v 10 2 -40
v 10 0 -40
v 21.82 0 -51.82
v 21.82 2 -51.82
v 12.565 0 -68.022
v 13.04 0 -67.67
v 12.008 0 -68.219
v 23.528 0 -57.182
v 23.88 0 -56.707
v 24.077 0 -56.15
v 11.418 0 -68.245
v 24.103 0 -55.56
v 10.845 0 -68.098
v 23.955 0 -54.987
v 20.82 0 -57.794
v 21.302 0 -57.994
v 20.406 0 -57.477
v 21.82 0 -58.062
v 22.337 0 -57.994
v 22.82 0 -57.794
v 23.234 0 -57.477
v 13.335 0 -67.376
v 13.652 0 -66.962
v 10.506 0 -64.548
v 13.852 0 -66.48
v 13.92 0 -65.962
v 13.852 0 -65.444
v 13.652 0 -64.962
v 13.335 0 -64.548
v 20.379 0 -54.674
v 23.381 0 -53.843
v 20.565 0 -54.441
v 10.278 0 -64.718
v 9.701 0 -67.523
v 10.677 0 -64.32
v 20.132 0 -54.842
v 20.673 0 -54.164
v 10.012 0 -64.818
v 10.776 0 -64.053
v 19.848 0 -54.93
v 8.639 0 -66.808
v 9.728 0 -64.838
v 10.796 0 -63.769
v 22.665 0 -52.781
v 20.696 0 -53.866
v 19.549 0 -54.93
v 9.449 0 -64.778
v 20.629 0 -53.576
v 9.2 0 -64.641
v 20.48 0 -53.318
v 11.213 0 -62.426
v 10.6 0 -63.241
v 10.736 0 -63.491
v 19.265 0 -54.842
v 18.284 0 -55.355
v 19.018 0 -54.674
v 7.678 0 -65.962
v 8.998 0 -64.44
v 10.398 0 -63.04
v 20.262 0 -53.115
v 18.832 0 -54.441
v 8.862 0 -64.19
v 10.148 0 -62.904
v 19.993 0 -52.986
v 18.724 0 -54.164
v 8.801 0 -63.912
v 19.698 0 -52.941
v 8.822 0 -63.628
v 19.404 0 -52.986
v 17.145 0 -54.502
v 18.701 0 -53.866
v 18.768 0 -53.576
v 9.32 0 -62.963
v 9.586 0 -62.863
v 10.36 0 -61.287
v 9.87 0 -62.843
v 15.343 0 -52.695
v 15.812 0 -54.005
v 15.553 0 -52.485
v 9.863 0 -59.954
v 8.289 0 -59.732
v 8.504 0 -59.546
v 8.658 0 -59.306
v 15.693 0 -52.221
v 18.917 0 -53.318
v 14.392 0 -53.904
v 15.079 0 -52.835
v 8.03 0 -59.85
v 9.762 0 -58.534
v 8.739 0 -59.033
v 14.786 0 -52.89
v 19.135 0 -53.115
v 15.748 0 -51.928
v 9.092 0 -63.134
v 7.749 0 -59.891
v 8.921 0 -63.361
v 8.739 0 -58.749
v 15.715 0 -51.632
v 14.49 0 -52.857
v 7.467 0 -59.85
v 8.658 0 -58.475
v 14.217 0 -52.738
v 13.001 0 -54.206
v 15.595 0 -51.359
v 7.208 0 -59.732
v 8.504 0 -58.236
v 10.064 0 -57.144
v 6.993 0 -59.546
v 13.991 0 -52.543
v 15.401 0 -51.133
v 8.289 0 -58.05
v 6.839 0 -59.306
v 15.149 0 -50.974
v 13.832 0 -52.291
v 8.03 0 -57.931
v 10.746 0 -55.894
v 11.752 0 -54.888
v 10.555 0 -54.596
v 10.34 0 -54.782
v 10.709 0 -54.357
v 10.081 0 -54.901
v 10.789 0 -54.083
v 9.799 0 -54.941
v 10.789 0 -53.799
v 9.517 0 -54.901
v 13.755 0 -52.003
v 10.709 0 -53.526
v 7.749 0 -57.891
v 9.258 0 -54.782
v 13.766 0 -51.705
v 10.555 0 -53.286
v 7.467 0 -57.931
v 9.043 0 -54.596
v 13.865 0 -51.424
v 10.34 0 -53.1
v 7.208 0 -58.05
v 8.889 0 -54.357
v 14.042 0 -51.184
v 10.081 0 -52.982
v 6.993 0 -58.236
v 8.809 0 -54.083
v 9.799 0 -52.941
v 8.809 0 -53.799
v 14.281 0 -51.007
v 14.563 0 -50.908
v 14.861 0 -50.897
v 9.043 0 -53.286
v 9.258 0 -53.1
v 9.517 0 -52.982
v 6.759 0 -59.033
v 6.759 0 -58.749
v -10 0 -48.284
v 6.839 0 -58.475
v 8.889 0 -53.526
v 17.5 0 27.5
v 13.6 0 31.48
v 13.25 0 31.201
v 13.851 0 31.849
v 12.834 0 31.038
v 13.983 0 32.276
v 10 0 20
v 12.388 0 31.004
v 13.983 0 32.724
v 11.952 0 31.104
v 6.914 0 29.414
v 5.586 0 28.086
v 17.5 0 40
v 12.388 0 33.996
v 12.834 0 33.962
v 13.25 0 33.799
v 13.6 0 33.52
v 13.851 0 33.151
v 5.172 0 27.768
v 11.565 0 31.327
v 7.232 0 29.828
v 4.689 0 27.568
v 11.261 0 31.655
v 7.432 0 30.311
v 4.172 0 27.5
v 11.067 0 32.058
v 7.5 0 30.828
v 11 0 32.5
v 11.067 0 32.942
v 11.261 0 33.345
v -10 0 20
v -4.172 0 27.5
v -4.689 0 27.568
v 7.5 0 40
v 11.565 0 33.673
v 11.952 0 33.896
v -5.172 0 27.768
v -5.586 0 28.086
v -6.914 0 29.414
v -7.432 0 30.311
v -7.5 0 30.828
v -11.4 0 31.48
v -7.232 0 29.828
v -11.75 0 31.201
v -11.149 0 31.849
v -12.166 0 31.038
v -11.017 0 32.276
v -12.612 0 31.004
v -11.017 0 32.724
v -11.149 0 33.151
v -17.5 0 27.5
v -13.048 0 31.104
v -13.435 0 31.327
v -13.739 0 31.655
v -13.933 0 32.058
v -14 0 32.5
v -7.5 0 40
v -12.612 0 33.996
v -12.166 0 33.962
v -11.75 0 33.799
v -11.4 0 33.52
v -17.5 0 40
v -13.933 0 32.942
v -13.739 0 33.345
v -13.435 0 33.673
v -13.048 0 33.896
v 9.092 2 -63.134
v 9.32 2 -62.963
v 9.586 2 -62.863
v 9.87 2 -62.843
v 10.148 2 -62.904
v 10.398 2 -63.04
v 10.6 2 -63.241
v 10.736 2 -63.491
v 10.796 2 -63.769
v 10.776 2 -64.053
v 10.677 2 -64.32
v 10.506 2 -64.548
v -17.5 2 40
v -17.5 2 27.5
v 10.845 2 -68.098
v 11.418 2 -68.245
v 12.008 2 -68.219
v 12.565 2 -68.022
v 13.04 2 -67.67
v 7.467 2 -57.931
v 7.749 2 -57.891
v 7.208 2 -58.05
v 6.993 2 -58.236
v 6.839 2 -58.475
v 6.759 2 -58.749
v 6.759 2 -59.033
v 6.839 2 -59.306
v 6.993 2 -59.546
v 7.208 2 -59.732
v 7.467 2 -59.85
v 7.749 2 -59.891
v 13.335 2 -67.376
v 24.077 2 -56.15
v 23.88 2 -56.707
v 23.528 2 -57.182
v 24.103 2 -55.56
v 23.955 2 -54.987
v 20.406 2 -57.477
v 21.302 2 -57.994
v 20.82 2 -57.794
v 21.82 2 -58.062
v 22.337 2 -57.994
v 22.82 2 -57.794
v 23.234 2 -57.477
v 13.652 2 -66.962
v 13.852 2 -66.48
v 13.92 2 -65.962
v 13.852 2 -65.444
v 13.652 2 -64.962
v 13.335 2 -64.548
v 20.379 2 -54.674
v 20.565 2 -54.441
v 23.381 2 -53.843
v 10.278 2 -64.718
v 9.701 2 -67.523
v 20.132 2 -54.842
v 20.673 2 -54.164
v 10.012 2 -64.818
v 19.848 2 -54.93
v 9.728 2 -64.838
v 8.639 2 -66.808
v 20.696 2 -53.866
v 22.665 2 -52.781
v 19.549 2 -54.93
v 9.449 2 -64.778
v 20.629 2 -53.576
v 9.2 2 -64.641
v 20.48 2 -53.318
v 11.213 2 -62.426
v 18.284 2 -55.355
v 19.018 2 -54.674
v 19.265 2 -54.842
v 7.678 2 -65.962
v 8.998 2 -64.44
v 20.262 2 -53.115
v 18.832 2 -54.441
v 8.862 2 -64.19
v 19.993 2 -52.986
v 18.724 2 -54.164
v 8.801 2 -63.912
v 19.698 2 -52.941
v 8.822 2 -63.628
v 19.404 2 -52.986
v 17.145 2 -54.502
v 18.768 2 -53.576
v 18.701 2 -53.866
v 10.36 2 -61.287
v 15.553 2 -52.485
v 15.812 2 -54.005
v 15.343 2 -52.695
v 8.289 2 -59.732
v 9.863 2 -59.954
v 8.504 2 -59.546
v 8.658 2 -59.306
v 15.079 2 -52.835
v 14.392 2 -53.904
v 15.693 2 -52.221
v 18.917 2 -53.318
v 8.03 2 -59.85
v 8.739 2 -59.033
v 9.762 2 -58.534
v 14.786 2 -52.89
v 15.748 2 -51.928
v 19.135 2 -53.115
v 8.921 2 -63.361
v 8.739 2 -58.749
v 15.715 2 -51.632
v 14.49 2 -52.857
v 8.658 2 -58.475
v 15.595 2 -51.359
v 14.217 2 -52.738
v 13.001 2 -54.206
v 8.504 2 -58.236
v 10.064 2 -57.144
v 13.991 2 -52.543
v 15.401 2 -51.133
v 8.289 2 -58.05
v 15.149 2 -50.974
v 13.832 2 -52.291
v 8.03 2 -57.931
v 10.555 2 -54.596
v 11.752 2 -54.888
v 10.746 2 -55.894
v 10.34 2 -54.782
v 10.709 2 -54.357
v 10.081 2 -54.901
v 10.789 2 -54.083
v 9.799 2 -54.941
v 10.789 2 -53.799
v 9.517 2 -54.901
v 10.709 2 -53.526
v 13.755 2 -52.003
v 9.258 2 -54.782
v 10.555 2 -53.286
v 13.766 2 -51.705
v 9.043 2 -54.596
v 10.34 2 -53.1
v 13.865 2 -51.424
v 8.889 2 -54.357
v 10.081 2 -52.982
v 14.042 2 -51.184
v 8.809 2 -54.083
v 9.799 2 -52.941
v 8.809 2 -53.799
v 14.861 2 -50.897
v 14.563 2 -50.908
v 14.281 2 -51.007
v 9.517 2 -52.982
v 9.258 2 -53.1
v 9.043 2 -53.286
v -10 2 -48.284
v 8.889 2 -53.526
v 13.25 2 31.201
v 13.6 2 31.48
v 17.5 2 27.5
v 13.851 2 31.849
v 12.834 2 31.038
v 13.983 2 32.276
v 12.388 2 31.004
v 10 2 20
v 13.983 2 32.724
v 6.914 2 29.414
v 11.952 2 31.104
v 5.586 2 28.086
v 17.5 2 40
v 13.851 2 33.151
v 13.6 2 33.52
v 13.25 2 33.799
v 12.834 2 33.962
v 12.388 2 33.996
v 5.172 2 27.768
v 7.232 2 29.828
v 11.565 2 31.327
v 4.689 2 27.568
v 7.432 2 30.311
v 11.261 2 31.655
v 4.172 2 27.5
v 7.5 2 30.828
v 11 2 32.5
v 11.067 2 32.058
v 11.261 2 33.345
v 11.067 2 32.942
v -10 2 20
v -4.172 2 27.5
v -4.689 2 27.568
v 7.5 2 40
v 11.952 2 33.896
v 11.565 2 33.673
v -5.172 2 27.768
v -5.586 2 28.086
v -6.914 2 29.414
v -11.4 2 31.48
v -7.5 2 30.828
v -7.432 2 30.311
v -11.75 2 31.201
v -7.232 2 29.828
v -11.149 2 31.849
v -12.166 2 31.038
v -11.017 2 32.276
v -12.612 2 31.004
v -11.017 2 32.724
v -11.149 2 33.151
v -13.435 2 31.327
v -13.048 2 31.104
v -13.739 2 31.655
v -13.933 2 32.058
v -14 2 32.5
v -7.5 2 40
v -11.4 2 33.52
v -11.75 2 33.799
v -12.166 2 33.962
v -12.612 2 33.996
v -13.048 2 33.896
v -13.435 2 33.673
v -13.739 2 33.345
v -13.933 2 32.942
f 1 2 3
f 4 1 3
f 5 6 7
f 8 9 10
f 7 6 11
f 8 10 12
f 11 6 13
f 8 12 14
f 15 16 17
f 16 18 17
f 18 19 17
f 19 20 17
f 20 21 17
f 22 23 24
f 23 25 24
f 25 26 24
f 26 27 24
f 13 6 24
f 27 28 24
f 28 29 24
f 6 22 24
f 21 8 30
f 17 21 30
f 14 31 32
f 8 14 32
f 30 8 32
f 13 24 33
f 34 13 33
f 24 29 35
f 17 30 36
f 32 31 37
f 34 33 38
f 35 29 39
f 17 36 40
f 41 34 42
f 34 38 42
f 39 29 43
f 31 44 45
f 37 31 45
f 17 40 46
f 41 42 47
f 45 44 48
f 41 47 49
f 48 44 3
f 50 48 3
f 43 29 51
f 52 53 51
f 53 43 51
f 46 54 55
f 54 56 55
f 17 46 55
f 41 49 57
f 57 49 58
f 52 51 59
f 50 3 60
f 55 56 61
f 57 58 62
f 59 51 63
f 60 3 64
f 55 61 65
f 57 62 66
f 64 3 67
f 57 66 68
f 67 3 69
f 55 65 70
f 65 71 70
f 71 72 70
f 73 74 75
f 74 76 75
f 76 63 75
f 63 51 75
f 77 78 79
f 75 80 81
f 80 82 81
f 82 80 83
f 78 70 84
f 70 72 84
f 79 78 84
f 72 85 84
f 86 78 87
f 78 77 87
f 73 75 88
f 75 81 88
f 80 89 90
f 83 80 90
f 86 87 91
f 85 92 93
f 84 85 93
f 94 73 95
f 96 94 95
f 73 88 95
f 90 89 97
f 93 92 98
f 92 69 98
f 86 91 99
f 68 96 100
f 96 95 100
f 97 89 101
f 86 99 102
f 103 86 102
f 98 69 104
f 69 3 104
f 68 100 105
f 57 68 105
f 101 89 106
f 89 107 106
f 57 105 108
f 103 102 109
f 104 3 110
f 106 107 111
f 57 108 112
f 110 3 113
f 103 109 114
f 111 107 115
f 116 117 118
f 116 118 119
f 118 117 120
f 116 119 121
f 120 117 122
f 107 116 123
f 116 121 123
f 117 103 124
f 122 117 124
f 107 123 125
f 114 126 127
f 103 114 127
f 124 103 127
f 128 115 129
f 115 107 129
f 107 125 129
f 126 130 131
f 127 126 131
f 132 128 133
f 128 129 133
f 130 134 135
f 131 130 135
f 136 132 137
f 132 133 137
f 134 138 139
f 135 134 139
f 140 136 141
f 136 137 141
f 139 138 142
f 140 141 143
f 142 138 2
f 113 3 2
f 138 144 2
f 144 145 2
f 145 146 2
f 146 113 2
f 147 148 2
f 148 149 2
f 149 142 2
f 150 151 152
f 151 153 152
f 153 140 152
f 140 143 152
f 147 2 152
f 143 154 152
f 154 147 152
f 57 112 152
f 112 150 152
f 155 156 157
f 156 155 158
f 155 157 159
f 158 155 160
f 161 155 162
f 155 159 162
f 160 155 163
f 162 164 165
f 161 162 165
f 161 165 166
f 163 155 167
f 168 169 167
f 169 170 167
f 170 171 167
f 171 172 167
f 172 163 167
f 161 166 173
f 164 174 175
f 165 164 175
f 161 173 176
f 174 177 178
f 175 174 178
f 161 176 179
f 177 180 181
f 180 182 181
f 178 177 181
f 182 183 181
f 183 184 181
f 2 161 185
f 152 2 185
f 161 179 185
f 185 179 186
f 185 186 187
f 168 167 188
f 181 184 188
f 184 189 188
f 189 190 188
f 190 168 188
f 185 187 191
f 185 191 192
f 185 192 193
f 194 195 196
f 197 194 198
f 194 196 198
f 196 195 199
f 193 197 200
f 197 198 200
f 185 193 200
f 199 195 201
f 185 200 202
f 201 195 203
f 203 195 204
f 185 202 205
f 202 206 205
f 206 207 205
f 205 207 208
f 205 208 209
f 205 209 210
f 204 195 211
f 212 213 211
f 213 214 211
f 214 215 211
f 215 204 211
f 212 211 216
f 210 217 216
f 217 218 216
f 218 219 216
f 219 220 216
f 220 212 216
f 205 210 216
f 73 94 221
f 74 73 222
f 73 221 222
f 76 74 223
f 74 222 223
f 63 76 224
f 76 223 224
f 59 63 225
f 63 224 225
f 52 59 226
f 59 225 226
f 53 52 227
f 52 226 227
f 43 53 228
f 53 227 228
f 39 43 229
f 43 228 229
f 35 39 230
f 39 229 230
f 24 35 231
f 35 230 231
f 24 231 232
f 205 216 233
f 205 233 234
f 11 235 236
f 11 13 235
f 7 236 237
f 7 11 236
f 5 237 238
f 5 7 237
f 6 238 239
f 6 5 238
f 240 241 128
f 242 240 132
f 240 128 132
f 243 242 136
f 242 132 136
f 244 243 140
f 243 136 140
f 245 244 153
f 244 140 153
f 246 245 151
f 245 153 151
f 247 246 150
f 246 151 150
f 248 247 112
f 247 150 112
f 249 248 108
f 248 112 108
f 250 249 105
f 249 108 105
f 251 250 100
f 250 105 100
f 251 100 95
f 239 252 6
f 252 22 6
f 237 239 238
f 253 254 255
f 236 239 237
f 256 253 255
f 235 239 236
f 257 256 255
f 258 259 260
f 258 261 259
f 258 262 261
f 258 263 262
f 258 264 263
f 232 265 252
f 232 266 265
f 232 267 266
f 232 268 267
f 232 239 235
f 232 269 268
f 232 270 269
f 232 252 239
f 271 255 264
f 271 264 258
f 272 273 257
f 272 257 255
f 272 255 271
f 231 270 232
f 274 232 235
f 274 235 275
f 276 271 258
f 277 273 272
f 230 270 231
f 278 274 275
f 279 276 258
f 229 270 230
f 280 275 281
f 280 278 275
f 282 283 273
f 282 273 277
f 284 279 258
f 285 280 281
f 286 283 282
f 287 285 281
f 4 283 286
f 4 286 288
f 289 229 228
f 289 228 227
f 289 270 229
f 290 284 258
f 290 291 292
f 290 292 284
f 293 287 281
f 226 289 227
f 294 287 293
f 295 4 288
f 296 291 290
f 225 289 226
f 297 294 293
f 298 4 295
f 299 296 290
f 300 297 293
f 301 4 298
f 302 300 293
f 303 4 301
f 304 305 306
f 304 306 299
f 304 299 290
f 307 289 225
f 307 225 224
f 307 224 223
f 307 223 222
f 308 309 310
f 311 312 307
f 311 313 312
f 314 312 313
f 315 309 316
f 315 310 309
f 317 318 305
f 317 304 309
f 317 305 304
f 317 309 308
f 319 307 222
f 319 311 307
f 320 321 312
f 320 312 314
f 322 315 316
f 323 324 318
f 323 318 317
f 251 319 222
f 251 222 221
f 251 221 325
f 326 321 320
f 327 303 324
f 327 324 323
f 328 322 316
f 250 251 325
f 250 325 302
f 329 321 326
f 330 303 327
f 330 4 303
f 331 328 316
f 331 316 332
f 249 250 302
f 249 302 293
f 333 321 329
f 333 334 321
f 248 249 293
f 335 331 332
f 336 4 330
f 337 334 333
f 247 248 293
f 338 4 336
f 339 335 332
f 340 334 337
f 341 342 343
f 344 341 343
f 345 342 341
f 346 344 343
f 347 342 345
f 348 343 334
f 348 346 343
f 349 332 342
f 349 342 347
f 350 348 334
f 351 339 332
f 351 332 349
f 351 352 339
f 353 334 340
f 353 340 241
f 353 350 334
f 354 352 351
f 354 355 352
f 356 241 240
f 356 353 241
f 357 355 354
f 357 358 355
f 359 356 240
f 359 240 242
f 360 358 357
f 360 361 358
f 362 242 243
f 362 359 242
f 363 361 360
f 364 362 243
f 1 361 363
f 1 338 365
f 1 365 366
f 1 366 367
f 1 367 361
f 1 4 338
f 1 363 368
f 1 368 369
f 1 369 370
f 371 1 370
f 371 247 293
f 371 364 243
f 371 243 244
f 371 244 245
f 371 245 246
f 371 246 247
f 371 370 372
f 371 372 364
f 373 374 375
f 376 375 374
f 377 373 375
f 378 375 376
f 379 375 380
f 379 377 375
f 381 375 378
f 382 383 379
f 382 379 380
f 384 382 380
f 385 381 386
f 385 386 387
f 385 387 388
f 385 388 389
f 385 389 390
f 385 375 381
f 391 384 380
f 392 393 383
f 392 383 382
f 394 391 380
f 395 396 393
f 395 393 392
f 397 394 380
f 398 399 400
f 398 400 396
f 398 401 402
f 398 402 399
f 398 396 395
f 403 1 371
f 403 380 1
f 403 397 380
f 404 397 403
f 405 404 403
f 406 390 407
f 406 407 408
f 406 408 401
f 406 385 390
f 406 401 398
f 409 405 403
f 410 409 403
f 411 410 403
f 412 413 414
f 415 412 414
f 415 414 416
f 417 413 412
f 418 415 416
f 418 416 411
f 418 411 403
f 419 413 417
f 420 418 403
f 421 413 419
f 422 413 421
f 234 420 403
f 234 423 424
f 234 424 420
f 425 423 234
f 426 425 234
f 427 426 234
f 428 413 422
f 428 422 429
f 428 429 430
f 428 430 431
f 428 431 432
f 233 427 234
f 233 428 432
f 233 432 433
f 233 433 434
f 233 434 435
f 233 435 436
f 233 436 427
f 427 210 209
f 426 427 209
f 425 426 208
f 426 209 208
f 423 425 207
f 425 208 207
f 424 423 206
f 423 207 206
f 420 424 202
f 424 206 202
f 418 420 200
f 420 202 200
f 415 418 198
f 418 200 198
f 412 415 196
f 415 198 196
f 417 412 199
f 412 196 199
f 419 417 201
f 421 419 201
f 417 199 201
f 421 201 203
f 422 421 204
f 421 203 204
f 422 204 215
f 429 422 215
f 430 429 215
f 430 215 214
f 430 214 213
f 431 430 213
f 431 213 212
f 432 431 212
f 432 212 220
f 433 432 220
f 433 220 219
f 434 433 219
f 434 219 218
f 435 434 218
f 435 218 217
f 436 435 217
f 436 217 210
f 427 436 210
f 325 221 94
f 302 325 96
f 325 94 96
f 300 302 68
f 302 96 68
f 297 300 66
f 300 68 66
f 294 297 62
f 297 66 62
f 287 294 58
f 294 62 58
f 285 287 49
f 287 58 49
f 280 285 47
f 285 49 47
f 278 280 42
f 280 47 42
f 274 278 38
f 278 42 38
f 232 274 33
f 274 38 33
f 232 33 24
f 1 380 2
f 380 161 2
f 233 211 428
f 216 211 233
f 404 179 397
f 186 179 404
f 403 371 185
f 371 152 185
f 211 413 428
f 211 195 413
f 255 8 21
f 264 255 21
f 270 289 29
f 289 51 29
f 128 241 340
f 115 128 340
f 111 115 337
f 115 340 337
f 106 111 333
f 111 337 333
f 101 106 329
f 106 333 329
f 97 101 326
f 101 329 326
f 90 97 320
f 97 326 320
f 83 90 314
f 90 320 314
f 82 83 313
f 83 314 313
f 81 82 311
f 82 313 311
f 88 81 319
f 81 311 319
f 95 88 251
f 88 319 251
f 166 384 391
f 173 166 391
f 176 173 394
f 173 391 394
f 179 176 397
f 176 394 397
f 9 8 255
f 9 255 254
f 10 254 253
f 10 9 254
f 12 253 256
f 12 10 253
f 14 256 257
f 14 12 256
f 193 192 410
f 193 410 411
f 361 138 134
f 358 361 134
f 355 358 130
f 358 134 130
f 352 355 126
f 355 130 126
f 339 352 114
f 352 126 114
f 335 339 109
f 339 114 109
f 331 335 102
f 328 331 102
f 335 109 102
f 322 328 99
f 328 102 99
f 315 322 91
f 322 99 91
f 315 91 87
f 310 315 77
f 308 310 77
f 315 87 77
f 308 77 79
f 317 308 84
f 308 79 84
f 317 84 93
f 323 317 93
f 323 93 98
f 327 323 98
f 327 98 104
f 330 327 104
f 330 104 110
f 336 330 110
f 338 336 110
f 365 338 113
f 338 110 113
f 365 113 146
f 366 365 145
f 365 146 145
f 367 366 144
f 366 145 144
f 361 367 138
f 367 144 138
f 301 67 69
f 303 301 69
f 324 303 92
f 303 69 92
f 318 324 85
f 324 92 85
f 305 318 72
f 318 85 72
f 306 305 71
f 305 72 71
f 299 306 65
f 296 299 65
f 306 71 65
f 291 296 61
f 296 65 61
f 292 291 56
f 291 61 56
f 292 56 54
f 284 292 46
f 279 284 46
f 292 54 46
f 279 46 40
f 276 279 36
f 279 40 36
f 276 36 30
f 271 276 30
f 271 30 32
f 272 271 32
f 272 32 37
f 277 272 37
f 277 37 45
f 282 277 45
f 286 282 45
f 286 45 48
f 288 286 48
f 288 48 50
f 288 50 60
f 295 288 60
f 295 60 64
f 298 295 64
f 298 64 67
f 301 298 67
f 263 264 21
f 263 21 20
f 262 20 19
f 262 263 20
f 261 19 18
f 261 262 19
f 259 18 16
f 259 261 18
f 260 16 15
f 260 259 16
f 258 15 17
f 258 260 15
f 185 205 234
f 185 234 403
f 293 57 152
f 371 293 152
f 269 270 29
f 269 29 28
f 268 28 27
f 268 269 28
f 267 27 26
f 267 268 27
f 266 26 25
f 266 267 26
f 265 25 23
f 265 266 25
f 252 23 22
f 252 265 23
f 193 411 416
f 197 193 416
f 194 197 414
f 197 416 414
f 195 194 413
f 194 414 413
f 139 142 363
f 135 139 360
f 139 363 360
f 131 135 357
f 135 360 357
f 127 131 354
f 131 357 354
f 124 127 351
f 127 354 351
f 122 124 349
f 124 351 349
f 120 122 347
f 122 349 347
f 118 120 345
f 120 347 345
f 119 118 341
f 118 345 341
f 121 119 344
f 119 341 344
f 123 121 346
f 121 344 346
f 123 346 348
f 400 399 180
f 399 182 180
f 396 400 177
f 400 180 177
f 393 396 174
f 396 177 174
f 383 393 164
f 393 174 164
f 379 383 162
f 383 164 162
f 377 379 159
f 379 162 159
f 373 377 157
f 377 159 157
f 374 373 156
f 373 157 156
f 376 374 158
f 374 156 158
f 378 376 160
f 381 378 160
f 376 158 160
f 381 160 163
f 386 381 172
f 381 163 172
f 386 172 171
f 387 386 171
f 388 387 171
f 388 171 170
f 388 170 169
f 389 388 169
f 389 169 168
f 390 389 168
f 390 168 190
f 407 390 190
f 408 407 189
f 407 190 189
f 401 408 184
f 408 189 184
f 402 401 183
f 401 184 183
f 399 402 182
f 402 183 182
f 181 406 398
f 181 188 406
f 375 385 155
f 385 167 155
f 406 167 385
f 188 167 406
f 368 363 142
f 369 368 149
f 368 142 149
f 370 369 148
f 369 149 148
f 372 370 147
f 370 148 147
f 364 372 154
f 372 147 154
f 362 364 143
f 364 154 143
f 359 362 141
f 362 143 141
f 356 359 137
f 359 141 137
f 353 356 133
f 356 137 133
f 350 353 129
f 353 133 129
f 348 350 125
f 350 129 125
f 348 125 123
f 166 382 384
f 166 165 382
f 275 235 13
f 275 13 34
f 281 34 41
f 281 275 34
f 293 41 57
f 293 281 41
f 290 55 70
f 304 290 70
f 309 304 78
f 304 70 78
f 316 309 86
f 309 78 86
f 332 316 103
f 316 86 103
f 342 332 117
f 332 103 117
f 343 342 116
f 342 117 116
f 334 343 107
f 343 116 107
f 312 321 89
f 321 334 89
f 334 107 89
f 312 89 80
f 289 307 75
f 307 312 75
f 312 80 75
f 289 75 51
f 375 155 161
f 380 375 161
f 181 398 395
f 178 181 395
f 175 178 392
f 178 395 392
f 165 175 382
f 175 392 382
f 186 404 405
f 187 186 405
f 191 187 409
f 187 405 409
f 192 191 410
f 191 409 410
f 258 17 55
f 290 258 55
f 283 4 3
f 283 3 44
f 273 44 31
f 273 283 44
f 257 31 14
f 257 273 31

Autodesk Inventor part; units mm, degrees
ref_plane "YZ Plane" through (0, 0, 0) normal (1, 0, 0) x (0, 1, 0)
ref_plane "XZ Plane" through (0, 0, 0) normal (0, 1, 0) x (-1, 0, 0)
ref_plane "XY Plane" through (0, 0, 0) normal (0, 0, 1) x (1, 0, 0)
sketch "スケッチ1" plane through (0, 0, 0) normal (0, 1, 0) x (-1, 0, 0)
  line L0 (-17.5, 40) -> (-7.5, 40)
  line L1 (-7.5, 40) -> (-7.5, 30)
  line L2 (-7.5, 30) -> (-5, 27.5)
  line L3 (-5, 27.5) -> (5, 27.5)
  line L4 (5, 27.5) -> (7.5, 30)
  line L5 (7.5, 30) -> (7.5, 40)
  line L6 (7.5, 40) -> (17.5, 40)
  circle A0 centre (-12.5, 32.5) radius 1.5
  circle A1 centre (12.5, 32.5) radius 1.5
  line L7 (-17.5, 40) -> (-17.5, 27.5)
  line L8 (-17.5, 27.5) -> (-10, 20)
  line L9 (17.5, 40) -> (17.5, 27.5)
  line L10 (17.5, 27.5) -> (10, 20)
  line L11 (-10, 20) -> (-10, -40)
  line L12 (-10, -40) -> (-25.3553, -55.3553)
  line L13 (-11.2132, -69.4975) -> (10, -48.2843)
  line L14 (10, -48.2843) -> (10, 20)
  line L15 (0, 0) -> (47.4517, 0)
  line L16 (-21.8198, -58.8909) -> (-18.2843, -55.3553)
  line L17 (-11.2132, -62.4264) -> (-14.7487, -65.9619)
  arc A2 (-11.2132, -62.4264) -> (-18.2843, -55.3553) centre (-14.7487, -58.8909) ccw
  line L18 (-25.3553, -55.3553) -> (-21.8198, -58.8909)
  line L19 (-14.7487, -65.9619) -> (-11.2132, -69.4975)
  dimension "d2" = 10
  dimension "d3" = 135
  dimension "d4" = 45
  dimension "d6" = 15
  dimension "d7" = 2.5
  dimension "d8" = 10
  dimension "d9" = 10
  dimension "d10" = 10
  dimension "d11" = 10
  dimension "d12" = 90
  dimension "d15" = 25
  dimension "d16" = 5
  dimension "d17" = 20
  dimension "d18" = 7.5
  dimension "d19" = 7.5
  dimension "d20" = 5
  dimension "d21" = 60
  dimension "d22" = 20
  dimension "d23" = 135
  dimension "d24" = 10
  dimension "d27" = 20
  dimension "d28" = 20
  dimension "d29" = 90
  dimension "d31" = 3
  dimension "d33" = 10
  dimension "d35" = 10
  dimension "d37" = 5
  dimension "d38" = 5
  dimension "d39" = 5
  dimension "d40" = 30
extrude "押し出し2" add sketch "スケッチ1" along normal blind 2
sketch "スケッチ2" plane through (0, 2, 0) normal (0, 1, 0) x (1, 0, 0)
  line L0 (25.3553, 55.3553) -> (21.8198, 58.8909) projected
  arc A0 (11.2132, 62.4264) -> (18.2843, 55.3553) centre (14.7487, 58.8909) ccw projected
  circle A1 centre (19.6985, 53.9411) radius 1
  point P0 (0, 0)
  dimension "d48" = 5
  dimension "d49" = 7
  dimension "d50" = 2
hole "穴1" at (19.6985, 2, -53.9411) direction (0, -1, 0) diameter 2 end through all
pattern_circular "円形状パターン1" count 5 over 180 about axis through (14.7487, 0, -58.8909) along (0, -1, 0) of "穴1"
sketch "スケッチ3" plane through (0, 2, 0) normal (0, 1, 0) x (1, 0, 0)
  circle A0 centre (9.799, 63.8406) radius 1 projected
  circle A1 centre (7.7487, 58.8909) radius 1 projected
  circle A2 centre (9.799, 53.9411) radius 1 projected
  circle A3 centre (14.7487, 51.8909) radius 1 projected
  circle A4 centre (19.6985, 53.9411) radius 1 projected
  circle A5 centre (-12.5, -32.5) radius 1.5 projected
  circle A6 centre (12.5, -32.5) radius 1.5 projected
  line L0 (7.5, -40) -> (17.5, -40) projected
  line L1 (17.5, -40) -> (17.5, -27.5) projected
  line L2 (17.5, -27.5) -> (10, -20) projected
  line L3 (10, -20) -> (10, 40) projected
  line L4 (10, 40) -> (25.3553, 55.3553) projected
  line L5 (25.3553, 55.3553) -> (21.8198, 58.8909) projected
  line L6 (21.8198, 58.8909) -> (18.2843, 55.3553) projected
  arc A7 (11.2132, 62.4264) -> (18.2843, 55.3553) centre (14.7487, 58.8909) ccw projected
  line L7 (11.2132, 62.4264) -> (14.7487, 65.9619) projected
  line L8 (14.7487, 65.9619) -> (11.2132, 69.4975) projected
  line L9 (11.2132, 69.4975) -> (-10, 48.2843) projected
  line L10 (-10, 48.2843) -> (-10, -20) projected
  line L11 (-10, -20) -> (-17.5, -27.5) projected
  line L12 (-17.5, -27.5) -> (-17.5, -40) projected
  line L13 (-17.5, -40) -> (-7.5, -40) projected
  line L14 (-7.5, -40) -> (-7.5, -30) projected
  line L15 (-7.5, -30) -> (-5, -27.5) projected
  line L16 (-5, -27.5) -> (5, -27.5) projected
  line L17 (5, -27.5) -> (7.5, -30) projected
  line L18 (7.5, -30) -> (7.5, -40) projected
  arc A8 (12.1605, 68.5501) -> (7.6777, 65.9619) centre (14.7487, 58.8909) ccw
  arc A9 (21.8198, 51.8198) -> (24.408, 56.3027) centre (14.7487, 58.8909) ccw
  point P0 (0, 0)
extrude "押し出し3" cut sketch "スケッチ3" against normal blind 2 contours L18 L17 L16 L15 L14 L13 L12 L11 L10 L9 A8 L8 L7 A7 L6 L5 A9 L4 L3 L2 L1 L0 keep common part
fillet "フィレット1" radius 2 4 edges at (14.7487, 1, -65.9619) (21.8198, 1, -58.8909) (24.408, 1, -56.3027) (12.1605, 1, -68.5501)
fillet "フィレット2" radius 2 4 edges at (-5, 1, 27.5) (-7.5, 1, 30) (5, 1, 27.5) (7.5, 1, 30)
properties part number "Arm_Link"
